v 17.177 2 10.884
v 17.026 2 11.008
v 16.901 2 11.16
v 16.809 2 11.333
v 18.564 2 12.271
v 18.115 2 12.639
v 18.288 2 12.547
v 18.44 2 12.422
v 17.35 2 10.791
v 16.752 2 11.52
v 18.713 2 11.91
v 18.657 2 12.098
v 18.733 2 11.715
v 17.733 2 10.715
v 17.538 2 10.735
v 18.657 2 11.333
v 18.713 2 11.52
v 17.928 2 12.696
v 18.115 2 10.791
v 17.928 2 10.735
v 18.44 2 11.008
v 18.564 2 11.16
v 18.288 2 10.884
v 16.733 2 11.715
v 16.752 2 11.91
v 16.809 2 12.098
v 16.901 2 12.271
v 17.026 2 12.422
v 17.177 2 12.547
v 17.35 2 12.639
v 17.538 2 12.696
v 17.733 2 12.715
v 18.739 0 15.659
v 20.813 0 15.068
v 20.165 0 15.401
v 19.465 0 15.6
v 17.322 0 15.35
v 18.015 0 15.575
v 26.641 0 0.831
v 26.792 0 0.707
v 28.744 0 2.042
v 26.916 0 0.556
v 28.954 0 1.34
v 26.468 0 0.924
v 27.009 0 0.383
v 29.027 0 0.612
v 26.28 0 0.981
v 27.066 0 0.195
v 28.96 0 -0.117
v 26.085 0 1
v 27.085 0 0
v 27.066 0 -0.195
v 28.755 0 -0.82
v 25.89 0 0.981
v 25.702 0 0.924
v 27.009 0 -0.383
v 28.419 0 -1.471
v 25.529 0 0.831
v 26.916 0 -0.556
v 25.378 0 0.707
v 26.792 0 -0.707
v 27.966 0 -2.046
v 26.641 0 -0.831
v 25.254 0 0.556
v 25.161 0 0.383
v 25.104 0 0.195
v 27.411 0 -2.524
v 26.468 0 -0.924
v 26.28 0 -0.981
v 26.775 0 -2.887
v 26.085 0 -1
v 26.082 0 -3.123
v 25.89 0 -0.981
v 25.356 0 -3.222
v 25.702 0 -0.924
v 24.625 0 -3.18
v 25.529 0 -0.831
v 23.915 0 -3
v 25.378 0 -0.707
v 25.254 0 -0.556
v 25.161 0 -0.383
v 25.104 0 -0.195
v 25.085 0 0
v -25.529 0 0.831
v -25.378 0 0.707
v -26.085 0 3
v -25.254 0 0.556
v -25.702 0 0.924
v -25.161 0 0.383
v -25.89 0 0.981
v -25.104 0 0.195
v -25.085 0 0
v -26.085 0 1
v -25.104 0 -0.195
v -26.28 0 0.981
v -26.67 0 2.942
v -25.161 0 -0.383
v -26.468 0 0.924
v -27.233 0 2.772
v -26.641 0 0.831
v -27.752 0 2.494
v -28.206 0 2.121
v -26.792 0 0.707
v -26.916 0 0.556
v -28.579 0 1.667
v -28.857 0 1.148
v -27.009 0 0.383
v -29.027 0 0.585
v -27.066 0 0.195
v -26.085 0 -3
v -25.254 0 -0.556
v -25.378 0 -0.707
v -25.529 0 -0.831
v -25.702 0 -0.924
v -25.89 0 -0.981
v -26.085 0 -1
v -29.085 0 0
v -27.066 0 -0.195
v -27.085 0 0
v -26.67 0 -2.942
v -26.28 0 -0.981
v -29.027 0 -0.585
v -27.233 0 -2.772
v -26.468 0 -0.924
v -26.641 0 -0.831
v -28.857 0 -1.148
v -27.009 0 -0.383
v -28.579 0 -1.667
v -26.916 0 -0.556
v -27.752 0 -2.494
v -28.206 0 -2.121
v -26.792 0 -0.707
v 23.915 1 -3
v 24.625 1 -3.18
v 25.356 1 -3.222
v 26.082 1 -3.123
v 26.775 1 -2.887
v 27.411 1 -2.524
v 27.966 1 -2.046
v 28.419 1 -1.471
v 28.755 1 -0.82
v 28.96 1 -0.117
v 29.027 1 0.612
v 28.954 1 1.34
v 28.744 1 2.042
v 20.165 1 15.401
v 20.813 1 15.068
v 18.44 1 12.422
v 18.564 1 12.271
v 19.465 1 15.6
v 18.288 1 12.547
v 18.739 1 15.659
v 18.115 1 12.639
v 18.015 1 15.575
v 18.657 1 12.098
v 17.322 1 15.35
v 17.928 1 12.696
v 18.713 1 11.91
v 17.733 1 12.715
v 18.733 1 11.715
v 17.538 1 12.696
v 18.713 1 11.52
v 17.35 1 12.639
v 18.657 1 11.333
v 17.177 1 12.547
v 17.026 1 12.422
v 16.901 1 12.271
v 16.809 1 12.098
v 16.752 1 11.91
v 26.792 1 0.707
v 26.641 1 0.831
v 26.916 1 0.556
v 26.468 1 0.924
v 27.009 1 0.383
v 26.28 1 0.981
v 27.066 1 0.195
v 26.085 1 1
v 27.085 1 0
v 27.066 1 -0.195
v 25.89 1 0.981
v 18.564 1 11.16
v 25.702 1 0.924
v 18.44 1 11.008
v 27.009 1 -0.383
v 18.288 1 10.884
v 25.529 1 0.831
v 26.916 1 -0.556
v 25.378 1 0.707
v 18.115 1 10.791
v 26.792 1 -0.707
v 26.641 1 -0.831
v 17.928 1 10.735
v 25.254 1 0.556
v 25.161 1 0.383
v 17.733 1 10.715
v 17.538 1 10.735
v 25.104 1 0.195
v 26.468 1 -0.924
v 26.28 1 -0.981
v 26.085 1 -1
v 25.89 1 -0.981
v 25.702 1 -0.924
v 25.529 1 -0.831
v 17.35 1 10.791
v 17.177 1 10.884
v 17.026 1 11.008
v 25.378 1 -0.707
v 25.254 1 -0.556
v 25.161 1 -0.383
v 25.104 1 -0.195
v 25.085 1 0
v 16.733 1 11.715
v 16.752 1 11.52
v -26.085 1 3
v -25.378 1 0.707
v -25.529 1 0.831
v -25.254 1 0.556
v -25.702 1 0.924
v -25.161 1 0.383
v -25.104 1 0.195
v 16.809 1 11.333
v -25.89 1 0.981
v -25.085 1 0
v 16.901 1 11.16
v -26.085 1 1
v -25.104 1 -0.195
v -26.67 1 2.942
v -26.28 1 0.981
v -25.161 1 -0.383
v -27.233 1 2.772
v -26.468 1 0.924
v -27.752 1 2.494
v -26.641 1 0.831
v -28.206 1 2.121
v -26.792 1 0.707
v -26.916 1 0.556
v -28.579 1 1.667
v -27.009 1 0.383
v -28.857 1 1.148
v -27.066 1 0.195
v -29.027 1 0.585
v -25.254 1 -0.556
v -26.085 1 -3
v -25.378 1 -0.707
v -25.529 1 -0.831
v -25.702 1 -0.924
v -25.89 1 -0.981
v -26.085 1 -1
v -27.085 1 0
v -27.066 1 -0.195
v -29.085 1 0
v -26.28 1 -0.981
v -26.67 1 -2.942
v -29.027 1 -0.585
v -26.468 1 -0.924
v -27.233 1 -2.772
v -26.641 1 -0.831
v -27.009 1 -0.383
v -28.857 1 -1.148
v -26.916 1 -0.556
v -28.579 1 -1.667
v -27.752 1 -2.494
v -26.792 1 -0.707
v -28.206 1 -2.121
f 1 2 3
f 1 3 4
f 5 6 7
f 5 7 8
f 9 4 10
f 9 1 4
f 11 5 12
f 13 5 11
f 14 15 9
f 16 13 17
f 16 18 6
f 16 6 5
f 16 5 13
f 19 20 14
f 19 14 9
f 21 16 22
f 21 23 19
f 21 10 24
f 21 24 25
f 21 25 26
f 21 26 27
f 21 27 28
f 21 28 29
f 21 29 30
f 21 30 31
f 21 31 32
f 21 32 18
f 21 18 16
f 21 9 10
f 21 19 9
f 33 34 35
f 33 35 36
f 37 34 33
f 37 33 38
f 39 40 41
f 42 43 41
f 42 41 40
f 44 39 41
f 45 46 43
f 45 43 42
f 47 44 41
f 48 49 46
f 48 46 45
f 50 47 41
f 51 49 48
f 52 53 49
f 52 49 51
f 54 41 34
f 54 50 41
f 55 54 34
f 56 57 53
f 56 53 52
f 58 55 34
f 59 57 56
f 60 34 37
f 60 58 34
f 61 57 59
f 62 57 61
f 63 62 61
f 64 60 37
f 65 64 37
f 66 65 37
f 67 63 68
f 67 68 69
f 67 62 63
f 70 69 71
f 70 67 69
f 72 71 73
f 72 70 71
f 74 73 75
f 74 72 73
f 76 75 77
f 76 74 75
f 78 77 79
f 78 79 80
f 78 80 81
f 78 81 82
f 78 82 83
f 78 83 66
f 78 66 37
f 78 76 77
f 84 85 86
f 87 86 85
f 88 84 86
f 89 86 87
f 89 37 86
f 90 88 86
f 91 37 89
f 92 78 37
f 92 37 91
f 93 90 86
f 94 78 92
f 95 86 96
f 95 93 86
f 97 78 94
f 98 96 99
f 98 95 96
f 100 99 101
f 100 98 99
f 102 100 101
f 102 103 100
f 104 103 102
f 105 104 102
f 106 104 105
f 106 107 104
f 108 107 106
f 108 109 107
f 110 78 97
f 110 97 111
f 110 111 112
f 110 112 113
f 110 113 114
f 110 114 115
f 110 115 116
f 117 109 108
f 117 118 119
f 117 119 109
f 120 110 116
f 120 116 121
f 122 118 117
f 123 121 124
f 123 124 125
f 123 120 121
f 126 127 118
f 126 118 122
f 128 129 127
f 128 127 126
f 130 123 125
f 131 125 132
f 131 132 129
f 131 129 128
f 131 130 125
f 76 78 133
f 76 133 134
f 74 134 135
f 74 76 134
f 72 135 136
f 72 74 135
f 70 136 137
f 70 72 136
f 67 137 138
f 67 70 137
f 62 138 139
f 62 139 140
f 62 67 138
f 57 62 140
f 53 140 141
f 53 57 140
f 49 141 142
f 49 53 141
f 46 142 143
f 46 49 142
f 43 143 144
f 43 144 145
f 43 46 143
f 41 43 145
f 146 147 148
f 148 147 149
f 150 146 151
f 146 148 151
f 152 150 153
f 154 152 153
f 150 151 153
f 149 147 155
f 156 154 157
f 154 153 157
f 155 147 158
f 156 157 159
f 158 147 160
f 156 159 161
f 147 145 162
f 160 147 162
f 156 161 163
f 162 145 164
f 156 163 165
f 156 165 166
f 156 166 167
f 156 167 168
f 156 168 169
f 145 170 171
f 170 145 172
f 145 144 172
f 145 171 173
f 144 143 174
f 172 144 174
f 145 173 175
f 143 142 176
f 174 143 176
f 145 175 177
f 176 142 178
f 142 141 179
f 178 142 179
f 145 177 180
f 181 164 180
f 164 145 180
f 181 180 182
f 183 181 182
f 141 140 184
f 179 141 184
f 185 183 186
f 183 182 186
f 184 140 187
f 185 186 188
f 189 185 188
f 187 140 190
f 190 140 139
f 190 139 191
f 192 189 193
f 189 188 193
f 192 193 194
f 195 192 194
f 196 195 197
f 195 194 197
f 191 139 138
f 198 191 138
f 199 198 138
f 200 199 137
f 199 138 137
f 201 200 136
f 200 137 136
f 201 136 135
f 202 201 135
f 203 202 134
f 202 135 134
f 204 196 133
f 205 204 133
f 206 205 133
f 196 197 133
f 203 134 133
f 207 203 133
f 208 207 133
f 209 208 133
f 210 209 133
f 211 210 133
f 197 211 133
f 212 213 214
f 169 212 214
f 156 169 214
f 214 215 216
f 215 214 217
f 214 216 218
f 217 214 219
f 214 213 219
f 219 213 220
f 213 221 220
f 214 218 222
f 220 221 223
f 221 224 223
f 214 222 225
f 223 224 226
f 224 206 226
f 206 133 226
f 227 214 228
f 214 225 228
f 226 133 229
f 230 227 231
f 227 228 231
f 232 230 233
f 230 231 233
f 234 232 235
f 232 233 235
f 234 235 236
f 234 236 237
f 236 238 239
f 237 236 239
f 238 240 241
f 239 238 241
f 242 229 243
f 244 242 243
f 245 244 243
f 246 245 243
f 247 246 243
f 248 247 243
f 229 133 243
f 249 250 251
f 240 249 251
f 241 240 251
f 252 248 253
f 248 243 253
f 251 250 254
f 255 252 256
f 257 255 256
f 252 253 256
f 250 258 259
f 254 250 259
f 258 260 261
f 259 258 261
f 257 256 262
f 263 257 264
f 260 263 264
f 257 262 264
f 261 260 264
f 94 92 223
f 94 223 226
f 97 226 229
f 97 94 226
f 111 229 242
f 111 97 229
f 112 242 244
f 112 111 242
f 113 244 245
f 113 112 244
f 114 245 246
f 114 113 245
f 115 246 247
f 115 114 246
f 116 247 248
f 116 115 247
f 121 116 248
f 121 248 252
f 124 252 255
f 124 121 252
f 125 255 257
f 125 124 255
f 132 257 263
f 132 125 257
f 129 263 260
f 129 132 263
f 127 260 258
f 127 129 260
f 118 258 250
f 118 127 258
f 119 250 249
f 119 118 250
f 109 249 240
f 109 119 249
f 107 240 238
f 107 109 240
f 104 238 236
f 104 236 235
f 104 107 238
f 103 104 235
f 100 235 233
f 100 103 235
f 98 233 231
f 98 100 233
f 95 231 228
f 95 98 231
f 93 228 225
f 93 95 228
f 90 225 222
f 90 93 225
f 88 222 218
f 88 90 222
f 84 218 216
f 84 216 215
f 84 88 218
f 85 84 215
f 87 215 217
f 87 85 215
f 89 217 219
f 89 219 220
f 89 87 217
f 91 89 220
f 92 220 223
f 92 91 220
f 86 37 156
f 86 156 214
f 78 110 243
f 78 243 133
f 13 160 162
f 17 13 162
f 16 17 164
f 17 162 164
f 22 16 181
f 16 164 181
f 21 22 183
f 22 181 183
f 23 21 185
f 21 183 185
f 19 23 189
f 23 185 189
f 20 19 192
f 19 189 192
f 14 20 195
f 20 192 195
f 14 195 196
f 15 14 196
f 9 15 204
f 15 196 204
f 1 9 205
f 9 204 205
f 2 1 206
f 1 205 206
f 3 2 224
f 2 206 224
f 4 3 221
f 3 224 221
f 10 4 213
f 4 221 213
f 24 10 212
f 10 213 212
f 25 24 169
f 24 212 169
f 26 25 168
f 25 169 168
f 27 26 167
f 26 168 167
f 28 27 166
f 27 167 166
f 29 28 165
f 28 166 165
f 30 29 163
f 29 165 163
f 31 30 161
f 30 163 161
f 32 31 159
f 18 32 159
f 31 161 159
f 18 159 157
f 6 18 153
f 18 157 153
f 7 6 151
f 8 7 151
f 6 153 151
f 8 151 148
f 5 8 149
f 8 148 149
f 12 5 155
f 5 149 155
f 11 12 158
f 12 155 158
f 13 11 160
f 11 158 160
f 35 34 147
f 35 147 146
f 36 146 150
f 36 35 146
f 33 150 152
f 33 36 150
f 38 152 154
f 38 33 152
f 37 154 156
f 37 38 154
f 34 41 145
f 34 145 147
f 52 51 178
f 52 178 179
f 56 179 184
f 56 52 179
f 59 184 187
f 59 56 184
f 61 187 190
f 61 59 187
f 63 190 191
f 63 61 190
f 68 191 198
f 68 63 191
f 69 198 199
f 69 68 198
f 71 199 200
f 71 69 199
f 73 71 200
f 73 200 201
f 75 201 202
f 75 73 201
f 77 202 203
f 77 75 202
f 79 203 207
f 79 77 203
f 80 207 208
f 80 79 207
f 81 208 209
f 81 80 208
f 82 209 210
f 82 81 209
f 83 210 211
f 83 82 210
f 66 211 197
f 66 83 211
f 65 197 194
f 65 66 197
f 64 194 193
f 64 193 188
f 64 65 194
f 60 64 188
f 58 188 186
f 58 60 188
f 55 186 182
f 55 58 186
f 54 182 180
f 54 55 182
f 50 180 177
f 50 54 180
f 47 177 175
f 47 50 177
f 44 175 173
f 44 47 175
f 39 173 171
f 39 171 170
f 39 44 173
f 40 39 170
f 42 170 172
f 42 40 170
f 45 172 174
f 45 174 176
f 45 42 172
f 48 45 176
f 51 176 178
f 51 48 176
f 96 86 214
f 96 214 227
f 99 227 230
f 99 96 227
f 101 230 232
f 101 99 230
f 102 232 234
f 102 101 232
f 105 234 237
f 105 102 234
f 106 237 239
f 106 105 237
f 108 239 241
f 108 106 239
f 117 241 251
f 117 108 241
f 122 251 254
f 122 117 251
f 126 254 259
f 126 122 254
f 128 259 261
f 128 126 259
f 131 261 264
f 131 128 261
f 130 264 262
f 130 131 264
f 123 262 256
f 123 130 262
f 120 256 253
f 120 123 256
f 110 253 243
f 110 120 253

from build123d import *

# Parameters (mm, degrees)
SKETCH1_R           = 1
BOSS_EXTRUDE4_DEPTH = 1
SKETCH4_R           = 1
BOSS_EXTRUDE5_DEPTH = 1


with BuildPart() as part:
    # Sketch1 → Boss-Extrude4 (new body)
    with BuildSketch(Plane(origin=(0, 0, 0), x_dir=(1, 0, 0), z_dir=(0, 1, 0))):
        with BuildLine():
            Line((-26.085, 3), (23.915, 3))
            ThreePointArc((23.915, 3), (27.965705649, 2.046261886), (28.743665769, -2.041844117))
            Line((28.743665769, -2.041844117), (20.812640503, -15.067570319))
            ThreePointArc((20.812640503, -15.067570319), (19.103092744, -15.647684769), (17.322461075, -15.350300892))
            Line((17.322461075, -15.350300892), (-26.085, -3))
            ThreePointArc((-26.085, -3), (-29.085, 0), (-26.085, 3))
        make_face()
        with Locations((-26.085, 0)):
            Circle(SKETCH1_R, mode=Mode.SUBTRACT)
        with Locations((26.085, 0)):
            Circle(SKETCH1_R, mode=Mode.SUBTRACT)
    extrude(amount=BOSS_EXTRUDE4_DEPTH)

    # Sketch4 → Boss-Extrude5 (add)
    with BuildSketch(Plane(origin=(0, 1, 0), x_dir=(1, 0, 0), z_dir=(0, 1, 0))):
        with Locations((17.732709605, -11.715326645)):
            Circle(SKETCH4_R)
    extrude(amount=BOSS_EXTRUDE5_DEPTH)


solid = part.part
